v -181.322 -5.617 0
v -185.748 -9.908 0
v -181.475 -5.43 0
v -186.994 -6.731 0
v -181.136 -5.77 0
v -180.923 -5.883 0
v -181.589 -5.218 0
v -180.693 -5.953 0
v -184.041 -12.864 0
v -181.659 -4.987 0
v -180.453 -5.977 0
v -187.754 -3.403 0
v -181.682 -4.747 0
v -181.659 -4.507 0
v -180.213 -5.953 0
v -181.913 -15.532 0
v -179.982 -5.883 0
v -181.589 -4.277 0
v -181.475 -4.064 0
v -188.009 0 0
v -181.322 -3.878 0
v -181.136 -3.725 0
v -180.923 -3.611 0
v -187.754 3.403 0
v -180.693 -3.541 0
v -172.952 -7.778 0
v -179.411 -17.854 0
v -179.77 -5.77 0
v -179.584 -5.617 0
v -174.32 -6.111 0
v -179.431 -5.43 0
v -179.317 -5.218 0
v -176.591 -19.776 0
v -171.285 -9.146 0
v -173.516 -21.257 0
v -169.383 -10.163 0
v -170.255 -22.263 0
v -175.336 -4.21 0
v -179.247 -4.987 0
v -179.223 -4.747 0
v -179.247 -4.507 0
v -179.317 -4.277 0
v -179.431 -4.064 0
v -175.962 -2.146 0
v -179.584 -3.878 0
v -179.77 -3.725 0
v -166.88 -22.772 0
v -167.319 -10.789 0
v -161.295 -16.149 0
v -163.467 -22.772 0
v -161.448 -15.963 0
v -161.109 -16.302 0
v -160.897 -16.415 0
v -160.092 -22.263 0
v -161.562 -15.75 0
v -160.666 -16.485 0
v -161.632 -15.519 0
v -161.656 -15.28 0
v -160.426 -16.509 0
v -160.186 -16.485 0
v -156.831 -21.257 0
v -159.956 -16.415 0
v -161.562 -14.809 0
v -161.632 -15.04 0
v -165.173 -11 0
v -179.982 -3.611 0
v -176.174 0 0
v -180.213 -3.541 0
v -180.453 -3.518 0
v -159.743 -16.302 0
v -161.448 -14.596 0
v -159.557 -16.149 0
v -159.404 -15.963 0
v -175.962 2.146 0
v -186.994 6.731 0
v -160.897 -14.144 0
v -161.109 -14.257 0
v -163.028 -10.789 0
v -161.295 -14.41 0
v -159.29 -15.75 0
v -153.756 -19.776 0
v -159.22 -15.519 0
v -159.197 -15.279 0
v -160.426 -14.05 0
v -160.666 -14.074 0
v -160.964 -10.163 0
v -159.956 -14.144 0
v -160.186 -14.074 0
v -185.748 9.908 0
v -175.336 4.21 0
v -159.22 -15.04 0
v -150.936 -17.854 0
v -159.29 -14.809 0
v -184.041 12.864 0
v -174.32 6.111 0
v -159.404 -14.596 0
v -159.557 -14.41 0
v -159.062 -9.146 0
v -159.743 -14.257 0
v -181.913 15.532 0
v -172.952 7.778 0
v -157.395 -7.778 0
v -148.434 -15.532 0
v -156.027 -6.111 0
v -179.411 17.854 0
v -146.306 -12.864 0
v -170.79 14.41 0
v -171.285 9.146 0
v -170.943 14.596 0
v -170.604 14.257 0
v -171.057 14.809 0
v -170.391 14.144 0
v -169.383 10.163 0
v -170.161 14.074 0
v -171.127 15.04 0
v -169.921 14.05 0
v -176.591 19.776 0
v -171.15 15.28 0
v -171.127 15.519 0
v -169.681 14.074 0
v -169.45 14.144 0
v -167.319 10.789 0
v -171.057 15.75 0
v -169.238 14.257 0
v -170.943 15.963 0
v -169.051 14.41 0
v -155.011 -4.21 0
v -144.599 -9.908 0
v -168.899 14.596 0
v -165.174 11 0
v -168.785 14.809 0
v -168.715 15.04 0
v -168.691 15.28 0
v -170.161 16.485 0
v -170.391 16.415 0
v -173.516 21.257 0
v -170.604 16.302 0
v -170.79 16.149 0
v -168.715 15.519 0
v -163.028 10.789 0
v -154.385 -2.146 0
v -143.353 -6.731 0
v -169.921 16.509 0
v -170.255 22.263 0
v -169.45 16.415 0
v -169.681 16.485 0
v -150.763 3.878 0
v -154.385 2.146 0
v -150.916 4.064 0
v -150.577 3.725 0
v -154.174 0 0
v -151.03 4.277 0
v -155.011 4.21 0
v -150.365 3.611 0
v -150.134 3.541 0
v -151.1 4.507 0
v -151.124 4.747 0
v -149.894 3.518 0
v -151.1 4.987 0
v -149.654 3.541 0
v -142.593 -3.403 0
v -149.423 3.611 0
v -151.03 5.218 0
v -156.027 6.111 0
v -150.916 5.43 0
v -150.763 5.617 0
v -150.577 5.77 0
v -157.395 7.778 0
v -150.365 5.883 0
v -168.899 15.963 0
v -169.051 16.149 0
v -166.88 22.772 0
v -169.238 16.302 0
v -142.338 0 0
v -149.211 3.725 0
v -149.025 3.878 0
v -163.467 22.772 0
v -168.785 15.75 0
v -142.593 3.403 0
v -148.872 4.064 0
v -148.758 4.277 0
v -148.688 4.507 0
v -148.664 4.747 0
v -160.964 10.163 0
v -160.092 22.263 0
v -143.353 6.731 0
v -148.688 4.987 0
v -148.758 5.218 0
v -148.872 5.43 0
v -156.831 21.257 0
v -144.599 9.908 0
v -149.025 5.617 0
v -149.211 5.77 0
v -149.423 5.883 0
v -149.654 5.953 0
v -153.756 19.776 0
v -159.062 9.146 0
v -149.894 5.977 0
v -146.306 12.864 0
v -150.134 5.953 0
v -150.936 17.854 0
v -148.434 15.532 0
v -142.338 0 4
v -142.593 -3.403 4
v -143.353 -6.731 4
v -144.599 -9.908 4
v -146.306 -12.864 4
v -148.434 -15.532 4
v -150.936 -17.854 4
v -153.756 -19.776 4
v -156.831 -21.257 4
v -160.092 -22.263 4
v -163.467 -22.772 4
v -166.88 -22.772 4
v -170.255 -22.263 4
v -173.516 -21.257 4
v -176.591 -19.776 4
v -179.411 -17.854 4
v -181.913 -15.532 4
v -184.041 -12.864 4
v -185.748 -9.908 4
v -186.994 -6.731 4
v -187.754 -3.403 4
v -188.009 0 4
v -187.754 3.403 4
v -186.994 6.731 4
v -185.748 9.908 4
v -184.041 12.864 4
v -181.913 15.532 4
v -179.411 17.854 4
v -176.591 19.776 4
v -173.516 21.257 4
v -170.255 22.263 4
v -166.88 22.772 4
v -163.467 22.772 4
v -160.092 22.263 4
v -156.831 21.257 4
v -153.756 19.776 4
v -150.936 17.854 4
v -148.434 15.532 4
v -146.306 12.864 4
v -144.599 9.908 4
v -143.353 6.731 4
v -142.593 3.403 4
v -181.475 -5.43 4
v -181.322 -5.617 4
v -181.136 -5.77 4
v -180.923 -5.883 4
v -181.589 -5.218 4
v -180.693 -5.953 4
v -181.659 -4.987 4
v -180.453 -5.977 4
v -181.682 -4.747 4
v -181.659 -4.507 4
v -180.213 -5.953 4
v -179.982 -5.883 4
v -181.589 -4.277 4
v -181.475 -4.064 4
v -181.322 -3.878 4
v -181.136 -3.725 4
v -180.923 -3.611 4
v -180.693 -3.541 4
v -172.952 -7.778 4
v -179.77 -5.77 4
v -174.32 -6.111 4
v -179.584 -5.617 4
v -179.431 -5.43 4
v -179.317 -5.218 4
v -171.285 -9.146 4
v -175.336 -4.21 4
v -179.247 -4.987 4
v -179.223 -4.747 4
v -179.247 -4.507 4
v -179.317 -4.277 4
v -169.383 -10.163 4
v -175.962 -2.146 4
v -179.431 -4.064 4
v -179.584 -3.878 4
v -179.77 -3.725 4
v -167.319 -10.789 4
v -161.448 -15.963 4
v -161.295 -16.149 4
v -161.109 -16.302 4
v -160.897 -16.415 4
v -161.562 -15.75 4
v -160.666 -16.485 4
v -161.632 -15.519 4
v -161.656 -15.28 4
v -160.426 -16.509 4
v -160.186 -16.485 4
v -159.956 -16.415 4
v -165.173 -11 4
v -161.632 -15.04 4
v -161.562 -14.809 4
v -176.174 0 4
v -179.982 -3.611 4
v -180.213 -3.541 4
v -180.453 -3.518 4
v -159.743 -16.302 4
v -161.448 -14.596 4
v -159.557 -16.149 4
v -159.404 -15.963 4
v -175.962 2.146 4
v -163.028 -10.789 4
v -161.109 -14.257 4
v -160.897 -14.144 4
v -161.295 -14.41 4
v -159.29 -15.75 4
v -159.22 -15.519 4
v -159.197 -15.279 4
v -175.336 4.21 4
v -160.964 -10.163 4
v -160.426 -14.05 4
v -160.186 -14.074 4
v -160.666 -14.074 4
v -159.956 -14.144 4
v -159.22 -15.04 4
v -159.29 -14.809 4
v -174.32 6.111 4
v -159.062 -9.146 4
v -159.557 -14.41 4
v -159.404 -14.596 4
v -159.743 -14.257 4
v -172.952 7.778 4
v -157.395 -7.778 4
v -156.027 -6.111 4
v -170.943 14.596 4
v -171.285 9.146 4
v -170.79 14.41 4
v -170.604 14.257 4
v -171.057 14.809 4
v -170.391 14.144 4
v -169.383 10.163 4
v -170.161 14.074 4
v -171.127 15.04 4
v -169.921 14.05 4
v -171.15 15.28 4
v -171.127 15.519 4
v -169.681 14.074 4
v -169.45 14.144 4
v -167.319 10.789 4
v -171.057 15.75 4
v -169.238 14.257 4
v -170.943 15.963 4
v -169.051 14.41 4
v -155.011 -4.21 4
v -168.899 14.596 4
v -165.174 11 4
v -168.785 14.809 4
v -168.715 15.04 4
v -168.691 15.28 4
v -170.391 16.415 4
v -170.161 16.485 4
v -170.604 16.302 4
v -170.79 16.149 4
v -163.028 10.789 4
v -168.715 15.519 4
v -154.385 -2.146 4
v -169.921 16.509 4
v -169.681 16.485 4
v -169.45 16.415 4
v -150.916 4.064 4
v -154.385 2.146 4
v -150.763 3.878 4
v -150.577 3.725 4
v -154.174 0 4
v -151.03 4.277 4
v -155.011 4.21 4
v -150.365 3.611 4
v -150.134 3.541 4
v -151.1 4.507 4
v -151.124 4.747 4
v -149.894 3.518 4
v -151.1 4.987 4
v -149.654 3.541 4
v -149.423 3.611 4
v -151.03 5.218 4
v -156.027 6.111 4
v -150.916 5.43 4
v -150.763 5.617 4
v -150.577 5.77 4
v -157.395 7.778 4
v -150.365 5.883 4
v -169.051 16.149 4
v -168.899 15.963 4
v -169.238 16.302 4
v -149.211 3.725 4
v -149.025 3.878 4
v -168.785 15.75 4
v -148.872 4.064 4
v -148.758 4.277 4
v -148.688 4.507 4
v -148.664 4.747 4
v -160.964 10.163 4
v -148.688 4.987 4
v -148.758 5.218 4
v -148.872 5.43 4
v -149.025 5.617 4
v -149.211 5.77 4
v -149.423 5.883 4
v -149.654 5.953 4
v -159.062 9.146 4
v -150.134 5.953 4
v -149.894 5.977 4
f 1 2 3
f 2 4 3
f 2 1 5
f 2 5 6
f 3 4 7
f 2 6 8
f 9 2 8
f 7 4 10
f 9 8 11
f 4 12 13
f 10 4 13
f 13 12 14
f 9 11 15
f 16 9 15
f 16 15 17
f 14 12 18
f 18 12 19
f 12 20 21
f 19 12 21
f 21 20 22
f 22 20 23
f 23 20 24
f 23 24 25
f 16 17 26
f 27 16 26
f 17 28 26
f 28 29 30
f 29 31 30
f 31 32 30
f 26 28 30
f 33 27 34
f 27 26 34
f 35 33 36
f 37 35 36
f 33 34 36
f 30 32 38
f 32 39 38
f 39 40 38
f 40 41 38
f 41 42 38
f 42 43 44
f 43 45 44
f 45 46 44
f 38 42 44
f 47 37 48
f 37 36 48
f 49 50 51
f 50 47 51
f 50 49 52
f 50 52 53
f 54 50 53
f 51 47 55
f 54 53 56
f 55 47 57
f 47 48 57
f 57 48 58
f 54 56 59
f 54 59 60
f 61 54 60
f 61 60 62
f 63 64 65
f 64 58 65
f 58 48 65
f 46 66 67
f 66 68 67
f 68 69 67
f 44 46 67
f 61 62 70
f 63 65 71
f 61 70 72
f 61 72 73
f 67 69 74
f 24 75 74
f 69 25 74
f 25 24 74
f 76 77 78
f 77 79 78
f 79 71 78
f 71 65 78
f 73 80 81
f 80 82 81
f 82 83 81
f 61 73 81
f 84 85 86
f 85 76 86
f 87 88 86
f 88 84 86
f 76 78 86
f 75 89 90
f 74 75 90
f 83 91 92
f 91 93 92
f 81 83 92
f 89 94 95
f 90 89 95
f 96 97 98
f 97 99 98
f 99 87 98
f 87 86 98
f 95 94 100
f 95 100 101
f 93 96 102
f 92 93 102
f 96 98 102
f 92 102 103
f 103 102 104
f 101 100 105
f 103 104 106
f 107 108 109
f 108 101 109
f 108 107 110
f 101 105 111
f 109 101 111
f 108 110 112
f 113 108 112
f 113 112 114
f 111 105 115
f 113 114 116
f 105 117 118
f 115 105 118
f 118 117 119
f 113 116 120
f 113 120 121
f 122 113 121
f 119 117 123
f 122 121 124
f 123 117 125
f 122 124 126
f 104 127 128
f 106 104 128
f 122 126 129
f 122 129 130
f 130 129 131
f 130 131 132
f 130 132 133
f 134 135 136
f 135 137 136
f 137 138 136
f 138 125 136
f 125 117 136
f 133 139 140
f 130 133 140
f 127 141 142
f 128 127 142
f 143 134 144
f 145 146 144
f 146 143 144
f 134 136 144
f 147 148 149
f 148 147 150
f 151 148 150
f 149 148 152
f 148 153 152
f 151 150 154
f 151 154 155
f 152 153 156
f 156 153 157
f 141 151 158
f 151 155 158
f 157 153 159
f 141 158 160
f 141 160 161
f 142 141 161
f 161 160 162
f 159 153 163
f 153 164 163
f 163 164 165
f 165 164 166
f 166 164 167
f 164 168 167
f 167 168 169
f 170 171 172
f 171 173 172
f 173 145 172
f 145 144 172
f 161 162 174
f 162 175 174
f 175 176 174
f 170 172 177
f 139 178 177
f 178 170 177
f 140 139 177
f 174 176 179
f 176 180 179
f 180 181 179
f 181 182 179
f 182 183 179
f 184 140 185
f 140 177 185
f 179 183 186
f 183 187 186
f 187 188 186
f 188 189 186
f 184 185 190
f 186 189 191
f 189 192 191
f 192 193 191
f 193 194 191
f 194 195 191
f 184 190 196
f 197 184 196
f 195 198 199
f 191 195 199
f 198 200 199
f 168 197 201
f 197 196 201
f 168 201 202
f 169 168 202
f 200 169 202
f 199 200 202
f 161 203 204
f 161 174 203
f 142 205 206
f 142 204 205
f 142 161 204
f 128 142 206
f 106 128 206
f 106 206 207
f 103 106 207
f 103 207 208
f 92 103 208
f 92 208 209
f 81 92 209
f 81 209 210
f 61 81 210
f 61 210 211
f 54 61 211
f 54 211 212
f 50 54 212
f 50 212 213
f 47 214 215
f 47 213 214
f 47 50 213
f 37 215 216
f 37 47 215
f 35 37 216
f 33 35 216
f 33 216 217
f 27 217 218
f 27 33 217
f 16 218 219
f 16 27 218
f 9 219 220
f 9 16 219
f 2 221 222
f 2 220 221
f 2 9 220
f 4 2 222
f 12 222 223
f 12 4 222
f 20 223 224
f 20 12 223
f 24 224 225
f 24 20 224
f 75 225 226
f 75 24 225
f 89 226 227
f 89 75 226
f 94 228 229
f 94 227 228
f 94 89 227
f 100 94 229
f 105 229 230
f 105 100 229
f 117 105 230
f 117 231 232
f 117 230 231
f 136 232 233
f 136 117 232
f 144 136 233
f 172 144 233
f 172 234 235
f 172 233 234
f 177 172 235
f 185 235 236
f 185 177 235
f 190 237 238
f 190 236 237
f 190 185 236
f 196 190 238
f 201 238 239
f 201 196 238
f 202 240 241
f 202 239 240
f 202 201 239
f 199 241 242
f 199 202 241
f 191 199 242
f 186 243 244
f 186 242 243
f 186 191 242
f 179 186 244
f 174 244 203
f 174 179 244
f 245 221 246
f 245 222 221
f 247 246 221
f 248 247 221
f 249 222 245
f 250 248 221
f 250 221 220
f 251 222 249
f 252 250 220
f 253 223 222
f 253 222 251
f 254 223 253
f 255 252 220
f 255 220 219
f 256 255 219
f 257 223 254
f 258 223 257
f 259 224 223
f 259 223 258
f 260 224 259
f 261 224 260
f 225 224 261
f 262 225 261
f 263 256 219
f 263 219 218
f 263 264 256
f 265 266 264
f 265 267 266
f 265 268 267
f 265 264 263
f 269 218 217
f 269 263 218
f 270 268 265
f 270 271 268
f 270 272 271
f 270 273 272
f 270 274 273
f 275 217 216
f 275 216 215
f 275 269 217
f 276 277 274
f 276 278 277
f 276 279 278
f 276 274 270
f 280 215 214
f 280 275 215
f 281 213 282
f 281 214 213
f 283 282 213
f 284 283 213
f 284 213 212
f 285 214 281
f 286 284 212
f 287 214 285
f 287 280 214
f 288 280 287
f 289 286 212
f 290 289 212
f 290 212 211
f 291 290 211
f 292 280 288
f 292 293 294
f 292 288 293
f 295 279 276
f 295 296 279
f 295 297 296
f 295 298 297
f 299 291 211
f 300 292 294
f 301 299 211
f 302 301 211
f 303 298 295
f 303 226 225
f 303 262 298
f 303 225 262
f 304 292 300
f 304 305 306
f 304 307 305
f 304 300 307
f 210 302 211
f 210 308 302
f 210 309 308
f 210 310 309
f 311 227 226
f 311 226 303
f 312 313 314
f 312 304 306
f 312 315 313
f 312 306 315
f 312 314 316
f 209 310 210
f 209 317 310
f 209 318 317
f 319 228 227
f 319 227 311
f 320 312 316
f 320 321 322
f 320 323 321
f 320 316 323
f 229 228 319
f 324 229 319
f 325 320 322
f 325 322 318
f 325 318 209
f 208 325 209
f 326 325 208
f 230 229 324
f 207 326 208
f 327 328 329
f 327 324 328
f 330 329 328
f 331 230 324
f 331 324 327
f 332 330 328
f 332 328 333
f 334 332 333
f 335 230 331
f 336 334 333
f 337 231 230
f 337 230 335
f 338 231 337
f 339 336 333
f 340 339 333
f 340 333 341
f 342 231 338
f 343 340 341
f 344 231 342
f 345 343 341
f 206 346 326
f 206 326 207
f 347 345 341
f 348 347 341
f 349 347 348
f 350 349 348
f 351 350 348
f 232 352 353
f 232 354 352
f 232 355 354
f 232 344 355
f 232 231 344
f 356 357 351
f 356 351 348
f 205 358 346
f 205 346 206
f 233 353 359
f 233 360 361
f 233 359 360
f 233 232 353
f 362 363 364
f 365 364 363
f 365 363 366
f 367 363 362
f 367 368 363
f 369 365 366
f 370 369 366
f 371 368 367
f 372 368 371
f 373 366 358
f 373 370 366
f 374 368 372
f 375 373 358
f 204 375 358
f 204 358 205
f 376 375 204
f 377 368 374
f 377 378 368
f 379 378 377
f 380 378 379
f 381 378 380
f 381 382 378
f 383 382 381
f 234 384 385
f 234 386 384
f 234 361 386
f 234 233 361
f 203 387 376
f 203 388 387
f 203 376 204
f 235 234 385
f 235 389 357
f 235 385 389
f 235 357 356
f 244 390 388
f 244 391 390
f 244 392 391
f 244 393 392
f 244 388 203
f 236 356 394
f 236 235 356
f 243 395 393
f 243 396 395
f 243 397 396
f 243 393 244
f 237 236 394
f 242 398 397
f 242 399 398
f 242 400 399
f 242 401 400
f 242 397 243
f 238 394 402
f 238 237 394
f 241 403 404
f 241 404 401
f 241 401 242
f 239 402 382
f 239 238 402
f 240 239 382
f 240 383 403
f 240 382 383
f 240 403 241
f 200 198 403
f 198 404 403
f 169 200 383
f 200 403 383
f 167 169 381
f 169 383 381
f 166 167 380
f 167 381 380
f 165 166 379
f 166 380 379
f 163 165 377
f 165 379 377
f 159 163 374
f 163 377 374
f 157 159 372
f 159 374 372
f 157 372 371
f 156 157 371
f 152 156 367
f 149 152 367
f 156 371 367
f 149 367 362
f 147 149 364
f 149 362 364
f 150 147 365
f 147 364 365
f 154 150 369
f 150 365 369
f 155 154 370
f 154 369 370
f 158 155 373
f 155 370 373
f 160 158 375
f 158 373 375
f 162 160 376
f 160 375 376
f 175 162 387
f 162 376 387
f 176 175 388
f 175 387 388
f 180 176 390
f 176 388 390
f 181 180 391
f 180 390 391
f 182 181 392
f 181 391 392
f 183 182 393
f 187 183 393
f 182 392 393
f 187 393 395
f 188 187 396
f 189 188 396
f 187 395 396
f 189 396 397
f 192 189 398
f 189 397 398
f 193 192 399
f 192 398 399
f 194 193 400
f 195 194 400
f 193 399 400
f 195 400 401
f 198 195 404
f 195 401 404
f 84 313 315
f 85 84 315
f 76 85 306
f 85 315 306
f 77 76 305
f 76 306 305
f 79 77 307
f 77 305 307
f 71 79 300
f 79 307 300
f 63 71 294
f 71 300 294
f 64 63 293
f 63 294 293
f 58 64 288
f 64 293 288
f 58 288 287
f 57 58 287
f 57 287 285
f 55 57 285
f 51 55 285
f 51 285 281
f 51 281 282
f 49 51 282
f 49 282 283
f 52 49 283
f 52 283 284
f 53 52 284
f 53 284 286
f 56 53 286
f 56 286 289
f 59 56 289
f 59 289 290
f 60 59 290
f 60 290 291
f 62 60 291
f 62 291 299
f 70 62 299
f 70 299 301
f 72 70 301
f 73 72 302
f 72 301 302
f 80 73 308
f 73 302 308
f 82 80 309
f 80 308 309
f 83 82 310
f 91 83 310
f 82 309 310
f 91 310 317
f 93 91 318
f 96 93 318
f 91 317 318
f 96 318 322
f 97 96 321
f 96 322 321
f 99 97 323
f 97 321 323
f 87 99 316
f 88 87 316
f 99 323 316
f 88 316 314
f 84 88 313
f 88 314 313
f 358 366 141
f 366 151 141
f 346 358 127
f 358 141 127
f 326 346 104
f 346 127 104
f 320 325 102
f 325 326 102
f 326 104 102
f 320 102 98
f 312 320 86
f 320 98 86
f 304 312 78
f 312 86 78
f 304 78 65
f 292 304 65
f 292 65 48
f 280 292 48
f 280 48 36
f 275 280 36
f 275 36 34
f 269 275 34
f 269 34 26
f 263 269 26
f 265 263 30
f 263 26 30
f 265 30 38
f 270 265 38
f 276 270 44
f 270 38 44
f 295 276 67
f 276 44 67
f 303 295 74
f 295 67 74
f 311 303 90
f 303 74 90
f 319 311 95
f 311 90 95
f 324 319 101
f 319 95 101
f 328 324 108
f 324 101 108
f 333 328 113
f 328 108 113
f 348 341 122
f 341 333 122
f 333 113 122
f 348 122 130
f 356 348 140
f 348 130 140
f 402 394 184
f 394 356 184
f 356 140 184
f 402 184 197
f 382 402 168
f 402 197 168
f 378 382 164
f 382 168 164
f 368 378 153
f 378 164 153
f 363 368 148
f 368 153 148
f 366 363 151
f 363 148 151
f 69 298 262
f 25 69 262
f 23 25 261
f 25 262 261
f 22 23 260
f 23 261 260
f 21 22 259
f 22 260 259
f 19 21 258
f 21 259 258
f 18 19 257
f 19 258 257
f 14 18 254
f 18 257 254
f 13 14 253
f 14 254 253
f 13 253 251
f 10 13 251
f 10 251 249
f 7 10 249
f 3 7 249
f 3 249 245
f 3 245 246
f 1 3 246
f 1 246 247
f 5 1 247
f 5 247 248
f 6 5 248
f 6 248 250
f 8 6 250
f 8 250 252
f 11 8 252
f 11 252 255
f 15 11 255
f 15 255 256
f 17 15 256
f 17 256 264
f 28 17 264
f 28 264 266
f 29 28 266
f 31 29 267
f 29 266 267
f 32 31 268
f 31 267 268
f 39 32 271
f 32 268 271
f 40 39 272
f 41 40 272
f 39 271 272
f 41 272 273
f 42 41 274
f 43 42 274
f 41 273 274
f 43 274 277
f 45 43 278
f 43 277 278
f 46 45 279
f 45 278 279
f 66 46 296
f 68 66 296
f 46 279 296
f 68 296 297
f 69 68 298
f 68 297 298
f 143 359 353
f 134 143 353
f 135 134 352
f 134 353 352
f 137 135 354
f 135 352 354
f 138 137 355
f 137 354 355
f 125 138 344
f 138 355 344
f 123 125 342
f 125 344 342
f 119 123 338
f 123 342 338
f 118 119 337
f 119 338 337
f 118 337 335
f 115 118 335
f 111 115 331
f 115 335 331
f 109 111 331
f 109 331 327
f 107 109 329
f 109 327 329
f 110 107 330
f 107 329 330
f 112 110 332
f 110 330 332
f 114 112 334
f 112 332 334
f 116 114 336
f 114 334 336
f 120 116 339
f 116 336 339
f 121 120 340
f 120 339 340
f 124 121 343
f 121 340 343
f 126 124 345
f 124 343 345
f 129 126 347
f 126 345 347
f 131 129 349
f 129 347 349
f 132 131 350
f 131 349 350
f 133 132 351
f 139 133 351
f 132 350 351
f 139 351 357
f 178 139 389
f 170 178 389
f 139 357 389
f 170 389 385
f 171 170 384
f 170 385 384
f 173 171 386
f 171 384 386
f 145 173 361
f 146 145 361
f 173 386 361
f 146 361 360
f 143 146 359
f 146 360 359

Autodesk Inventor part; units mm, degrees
ref_plane "YZ Plane" through (0, 0, 0) normal (1, 0, 0) x (0, 1, 0)
ref_plane "Work Plane1" through (0, 0, 0) normal (0, 0, 1) x (1, 0, 0)
ref_plane "Work Plane2" through (0, 0, 0) normal (0, 0, 1) x (1, 0, 0)
sketch "Sketch2" plane through (0, 0, 0) normal (0, 0, 1) x (1, 0, 0)
  circle A0 centre (-137.1735, 0) radius 1.55
  circle A1 centre (-165.1735, -28) radius 1.55
  circle A2 centre (-165.1735, 28) radius 1.55
  circle A3 centre (-184.9724, -19.799) radius 1.55
  circle A4 centre (-145.3745, 19.799) radius 1.55
  circle A5 centre (-145.3745, -19.799) radius 1.55
  circle A6 centre (-184.9724, 19.799) radius 1.55
  circle A7 centre (-193.1735, 0) radius 1.55
  circle A8 centre (-165.1735, 0) radius 32.5
  circle A9 centre (-165.1735, 0) radius 22.8355
  circle A10 centre (-165.1735, 0) radius 11
  arc A11 (-152.3597, 3.5298) -> (-152.6156, 4.3532) centre (-149.894, 4.7473) ccw
  arc A12 (-152.6156, 4.3532) -> (-168.7032, 12.8137) centre (-165.1735, 0) ccw
  arc A13 (-168.7032, 12.8137) -> (-169.5266, 12.5579) centre (-169.9208, 15.2795) ccw
  arc A14 (-169.5266, 12.5579) -> (-177.9872, -3.5298) centre (-165.1735, 0) ccw
  arc A15 (-177.9872, -3.5298) -> (-177.7313, -4.3532) centre (-180.4529, -4.7473) ccw
  arc A16 (-177.7313, -4.3532) -> (-161.6437, -12.8137) centre (-165.1735, 0) ccw
  arc A17 (-161.6437, -12.8137) -> (-160.8203, -12.5579) centre (-160.4261, -15.2795) ccw
  arc A18 (-160.8203, -12.5579) -> (-152.3597, 3.5298) centre (-165.1735, 0) ccw
  circle A19 centre (-165.1735, 0) radius 20.2623
  circle A20 centre (-169.9208, 15.2795) radius 1.55
  circle A21 centre (-160.4261, -15.2795) radius 1.55
  circle A22 centre (-180.4529, -4.7473) radius 1.55
  circle A23 centre (-149.894, 4.7473) radius 1.55
  circle A24 centre (-165.1735, 0) radius 13.291
  point P0 (0, 0)
extrude "Extrusion2" add sketch "Sketch2" along normal blind 4 contours A9 | A24 A11 | A18 A24 A16 A14 A12 | A24 A13 | A17 A24 | A24 A15 | A19 | A20 | A21 | A22 | A23
sketch "Sketch3" plane through (-165.1735, 0, 0) normal (0, 0, -1) x (-1, 0, 0)
  point P0 (-165.1735, 0)
  point P1 (-15.2795, 4.7473)
  point P2 (4.7473, 15.2795)
  point P3 (15.2795, -4.7473)
  point P4 (-4.7473, -15.2795)
hole "Hole1" at (-149.894, 4.7473, 0) at (-169.9208, 15.2795, 0) at (-180.4529, -4.7473, 0) at (-160.4261, -15.2795, 0) direction (0, 0, 1) diameter 2.459 end through all thread size "M3x0.5" class "6H" standard "ISO Metric profile"
properties part number "lagerblokje" material "Aluminum 6061"
